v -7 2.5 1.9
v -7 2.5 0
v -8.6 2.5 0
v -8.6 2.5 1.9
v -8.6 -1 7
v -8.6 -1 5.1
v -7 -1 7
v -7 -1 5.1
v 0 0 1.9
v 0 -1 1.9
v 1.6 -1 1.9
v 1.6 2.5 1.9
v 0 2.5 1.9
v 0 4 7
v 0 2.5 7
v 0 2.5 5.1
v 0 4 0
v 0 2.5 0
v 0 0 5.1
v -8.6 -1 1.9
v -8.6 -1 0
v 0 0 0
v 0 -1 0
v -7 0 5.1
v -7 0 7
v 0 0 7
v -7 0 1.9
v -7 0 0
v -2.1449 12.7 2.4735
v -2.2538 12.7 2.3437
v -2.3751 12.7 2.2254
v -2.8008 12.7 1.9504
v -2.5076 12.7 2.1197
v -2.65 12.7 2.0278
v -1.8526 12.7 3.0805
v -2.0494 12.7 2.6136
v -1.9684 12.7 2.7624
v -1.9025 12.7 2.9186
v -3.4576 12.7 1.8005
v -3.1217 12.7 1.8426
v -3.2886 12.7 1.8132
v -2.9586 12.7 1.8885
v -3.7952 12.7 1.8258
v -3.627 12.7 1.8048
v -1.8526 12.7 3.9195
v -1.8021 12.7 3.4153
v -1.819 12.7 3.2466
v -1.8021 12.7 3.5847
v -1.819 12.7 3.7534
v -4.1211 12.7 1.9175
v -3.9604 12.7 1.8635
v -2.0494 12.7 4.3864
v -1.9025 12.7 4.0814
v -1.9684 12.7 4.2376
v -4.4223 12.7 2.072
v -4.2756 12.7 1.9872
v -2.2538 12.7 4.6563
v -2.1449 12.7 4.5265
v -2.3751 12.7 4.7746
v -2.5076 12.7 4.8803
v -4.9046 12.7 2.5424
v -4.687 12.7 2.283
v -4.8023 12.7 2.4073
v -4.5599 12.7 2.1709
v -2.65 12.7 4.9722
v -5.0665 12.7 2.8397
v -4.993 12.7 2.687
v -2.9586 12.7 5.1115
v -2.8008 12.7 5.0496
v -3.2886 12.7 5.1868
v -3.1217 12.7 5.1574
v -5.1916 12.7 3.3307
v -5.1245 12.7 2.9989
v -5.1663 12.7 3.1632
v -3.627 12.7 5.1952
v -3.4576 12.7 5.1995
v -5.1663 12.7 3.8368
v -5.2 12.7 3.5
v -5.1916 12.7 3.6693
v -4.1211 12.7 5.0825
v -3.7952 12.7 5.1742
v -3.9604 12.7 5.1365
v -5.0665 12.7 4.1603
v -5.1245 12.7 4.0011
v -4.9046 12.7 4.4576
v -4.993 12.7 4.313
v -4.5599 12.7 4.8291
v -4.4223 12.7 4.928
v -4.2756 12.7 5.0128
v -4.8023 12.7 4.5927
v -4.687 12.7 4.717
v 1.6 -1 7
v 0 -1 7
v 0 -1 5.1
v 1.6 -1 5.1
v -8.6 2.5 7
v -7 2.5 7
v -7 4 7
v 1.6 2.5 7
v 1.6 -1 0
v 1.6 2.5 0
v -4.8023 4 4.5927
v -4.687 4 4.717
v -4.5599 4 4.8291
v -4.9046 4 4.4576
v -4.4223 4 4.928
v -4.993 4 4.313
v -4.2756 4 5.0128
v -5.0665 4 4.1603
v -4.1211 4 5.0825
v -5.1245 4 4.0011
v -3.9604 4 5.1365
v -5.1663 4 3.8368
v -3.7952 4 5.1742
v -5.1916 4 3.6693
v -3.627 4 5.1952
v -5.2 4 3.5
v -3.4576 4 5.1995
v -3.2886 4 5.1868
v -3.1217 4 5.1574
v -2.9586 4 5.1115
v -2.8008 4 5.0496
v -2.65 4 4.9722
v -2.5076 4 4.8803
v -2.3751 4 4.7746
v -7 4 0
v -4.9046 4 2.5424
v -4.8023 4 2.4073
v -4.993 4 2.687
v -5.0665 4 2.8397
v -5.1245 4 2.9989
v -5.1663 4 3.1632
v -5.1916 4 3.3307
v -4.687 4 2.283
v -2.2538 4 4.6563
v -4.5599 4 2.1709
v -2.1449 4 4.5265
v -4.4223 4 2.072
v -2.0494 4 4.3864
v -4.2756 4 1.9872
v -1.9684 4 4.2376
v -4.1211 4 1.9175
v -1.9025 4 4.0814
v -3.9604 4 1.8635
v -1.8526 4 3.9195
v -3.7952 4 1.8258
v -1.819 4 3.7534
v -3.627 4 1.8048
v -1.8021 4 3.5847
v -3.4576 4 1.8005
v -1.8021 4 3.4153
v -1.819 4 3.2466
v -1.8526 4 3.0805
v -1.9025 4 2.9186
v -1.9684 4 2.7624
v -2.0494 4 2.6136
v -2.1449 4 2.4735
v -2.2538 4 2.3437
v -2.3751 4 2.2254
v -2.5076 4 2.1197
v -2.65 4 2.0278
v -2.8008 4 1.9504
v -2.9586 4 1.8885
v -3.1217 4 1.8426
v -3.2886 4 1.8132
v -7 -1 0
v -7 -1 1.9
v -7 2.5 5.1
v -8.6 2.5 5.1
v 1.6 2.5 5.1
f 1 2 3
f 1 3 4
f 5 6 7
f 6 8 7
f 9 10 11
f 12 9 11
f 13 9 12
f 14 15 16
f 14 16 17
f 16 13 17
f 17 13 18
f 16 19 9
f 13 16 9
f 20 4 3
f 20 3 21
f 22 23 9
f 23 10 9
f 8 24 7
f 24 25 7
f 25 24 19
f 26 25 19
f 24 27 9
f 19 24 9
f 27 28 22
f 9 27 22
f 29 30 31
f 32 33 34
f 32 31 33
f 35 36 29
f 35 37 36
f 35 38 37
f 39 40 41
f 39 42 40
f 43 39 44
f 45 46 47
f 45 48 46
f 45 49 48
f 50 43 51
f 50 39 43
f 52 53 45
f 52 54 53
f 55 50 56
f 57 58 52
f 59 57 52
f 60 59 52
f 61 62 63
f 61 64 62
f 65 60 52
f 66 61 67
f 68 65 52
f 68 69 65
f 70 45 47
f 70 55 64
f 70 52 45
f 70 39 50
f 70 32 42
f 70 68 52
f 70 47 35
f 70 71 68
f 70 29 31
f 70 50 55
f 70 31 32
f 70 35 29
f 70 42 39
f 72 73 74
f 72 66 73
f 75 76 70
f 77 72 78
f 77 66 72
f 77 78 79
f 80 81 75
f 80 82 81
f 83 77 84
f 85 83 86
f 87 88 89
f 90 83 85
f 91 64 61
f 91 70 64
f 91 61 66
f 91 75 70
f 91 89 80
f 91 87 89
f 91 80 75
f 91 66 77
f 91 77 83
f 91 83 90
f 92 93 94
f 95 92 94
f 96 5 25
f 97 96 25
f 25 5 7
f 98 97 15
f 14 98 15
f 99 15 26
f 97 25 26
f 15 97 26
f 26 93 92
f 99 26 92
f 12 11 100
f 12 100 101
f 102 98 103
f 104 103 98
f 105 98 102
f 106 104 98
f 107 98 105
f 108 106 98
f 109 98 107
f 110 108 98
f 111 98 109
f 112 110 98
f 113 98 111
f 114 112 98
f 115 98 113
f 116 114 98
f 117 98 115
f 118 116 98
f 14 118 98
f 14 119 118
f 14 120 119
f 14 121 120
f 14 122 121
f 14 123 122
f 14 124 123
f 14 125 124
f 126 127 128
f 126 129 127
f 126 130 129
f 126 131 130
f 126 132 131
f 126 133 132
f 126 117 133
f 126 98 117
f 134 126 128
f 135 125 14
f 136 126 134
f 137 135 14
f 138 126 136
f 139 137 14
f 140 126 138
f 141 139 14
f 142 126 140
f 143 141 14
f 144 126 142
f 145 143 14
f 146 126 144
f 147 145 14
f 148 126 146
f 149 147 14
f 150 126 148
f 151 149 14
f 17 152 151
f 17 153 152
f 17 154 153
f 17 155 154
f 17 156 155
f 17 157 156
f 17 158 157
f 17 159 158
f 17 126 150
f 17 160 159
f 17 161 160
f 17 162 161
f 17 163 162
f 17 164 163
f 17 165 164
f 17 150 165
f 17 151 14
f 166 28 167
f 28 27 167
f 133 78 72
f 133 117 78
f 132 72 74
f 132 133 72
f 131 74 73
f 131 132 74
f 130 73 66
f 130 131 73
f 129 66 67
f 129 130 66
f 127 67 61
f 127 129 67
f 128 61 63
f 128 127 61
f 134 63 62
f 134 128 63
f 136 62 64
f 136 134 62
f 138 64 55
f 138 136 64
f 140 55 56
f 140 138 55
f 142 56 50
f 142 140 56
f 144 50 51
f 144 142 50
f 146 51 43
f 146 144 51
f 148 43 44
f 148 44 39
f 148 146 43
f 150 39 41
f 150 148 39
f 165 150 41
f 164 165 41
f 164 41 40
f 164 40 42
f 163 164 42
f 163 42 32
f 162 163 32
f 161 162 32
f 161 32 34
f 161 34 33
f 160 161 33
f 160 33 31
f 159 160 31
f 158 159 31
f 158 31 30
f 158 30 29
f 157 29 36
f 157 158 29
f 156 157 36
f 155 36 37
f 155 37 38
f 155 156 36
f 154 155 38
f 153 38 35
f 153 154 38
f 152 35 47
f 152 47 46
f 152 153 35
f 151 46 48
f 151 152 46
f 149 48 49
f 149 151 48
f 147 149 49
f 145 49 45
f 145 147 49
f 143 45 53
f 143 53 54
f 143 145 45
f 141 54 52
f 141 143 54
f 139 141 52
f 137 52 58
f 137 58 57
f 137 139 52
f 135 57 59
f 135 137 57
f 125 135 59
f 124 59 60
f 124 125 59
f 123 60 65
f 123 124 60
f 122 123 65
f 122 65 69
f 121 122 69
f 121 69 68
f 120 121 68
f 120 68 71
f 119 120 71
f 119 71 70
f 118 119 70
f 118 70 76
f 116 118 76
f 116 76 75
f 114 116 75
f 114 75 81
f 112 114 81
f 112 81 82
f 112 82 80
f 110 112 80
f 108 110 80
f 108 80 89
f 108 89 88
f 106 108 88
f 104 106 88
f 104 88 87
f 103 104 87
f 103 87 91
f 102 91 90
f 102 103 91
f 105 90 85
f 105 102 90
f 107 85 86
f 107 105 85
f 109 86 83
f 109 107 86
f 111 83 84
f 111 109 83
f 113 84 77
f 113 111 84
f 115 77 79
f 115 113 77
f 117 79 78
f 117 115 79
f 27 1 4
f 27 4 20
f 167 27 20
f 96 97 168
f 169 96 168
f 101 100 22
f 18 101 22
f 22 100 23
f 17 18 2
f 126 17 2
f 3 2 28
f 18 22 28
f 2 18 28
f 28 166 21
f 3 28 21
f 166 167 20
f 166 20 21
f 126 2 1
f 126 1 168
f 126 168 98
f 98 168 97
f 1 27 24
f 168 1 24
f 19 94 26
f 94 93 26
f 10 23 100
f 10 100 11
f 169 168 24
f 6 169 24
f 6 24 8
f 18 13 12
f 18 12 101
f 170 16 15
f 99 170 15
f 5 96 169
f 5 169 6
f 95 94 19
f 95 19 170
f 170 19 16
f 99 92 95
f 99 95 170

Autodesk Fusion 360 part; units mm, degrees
sketch "Sketch1" plane through (0, 0, 0) normal (0, 1, 0) x (1, 0, 0)
  line L0 (0, 0) -> (-7, 0)
  line L1 (-7, 0) -> (-7, -7)
  line L2 (-7, -7) -> (0, -7)
  line L3 (0, -7) -> (0, 0)
  dimension "d1" = 7
  dimension "d2" = 7
extrude "Extrude1" add sketch "Sketch1" along normal blind 4
sketch "Sketch2" plane through (0, 4, 0) normal (0, 1, 0) x (-1, 0, 0)
  line L0 (0, 7) -> (0, 0)
  line L1 (0, 0) -> (7, 0)
  line L2 (7, 0) -> (7, 7)
  line L3 (7, 7) -> (0, 7)
  line L4 (3.5, 7) -> (3.5, 0)
  line L5 (7, 3.5) -> (0, 3.5)
  circle A0 centre (3.5, 3.5) radius 1.7
  dimension "d5" = 3.4
extrude "Extrude2" add sketch "Sketch2" along normal blind 8.7 contours L4 L5 A0 | L4 L5 A0 | L4 L5 A0 | L4 L5 A0
ref_plane "WorkPlane1" through (-3.5, 0, 0) normal (1, 0, 0) x (0, 1, 0)
sketch "Sketch3" plane through (0, 0, 0) normal (1, 0, 0) x (0, 1, 0)
  line L0 (0, 7) -> (0, 0)
  line L1 (0, 0) -> (4, 0)
  line L2 (4, 0) -> (4, 7)
  line L3 (4, 7) -> (0, 7)
  line L4 (2.5, 0) -> (-1, 0)
  line L5 (-1, 0) -> (-1, 1.9)
  line L6 (-1, 1.9) -> (2.5, 1.9)
  line L7 (2.5, 1.9) -> (2.5, 0)
  line L8 (2.5, 7) -> (-1, 7)
  line L9 (-1, 7) -> (-1, 5.1)
  line L10 (-1, 5.1) -> (2.5, 5.1)
  line L11 (2.5, 5.1) -> (2.5, 7)
  line L12 (4, 7) -> (4, 0)
  dimension "d9" = 1.9
  dimension "d10" = 1.9
  dimension "d11" = 1.5
  dimension "d12" = 1.5
  dimension "d13" = 3.5
  dimension "d14" = 3.5
extrude "Extrude3" add sketch "Sketch3" along normal blind 1.6 contours L0 L3 L8 L10 L11 | L0 L8 L9 L10 | L0 L1 L4 L6 L7 | L0 L4 L5 L6
mirror "Mirror1" about plane through (-3.5, 0, 0) normal (1, 0, 0) of "Extrude3"
equation "d2 = d1"
equation "d10 = d9"
equation "d12 = d11"
equation "d14 = d13"
